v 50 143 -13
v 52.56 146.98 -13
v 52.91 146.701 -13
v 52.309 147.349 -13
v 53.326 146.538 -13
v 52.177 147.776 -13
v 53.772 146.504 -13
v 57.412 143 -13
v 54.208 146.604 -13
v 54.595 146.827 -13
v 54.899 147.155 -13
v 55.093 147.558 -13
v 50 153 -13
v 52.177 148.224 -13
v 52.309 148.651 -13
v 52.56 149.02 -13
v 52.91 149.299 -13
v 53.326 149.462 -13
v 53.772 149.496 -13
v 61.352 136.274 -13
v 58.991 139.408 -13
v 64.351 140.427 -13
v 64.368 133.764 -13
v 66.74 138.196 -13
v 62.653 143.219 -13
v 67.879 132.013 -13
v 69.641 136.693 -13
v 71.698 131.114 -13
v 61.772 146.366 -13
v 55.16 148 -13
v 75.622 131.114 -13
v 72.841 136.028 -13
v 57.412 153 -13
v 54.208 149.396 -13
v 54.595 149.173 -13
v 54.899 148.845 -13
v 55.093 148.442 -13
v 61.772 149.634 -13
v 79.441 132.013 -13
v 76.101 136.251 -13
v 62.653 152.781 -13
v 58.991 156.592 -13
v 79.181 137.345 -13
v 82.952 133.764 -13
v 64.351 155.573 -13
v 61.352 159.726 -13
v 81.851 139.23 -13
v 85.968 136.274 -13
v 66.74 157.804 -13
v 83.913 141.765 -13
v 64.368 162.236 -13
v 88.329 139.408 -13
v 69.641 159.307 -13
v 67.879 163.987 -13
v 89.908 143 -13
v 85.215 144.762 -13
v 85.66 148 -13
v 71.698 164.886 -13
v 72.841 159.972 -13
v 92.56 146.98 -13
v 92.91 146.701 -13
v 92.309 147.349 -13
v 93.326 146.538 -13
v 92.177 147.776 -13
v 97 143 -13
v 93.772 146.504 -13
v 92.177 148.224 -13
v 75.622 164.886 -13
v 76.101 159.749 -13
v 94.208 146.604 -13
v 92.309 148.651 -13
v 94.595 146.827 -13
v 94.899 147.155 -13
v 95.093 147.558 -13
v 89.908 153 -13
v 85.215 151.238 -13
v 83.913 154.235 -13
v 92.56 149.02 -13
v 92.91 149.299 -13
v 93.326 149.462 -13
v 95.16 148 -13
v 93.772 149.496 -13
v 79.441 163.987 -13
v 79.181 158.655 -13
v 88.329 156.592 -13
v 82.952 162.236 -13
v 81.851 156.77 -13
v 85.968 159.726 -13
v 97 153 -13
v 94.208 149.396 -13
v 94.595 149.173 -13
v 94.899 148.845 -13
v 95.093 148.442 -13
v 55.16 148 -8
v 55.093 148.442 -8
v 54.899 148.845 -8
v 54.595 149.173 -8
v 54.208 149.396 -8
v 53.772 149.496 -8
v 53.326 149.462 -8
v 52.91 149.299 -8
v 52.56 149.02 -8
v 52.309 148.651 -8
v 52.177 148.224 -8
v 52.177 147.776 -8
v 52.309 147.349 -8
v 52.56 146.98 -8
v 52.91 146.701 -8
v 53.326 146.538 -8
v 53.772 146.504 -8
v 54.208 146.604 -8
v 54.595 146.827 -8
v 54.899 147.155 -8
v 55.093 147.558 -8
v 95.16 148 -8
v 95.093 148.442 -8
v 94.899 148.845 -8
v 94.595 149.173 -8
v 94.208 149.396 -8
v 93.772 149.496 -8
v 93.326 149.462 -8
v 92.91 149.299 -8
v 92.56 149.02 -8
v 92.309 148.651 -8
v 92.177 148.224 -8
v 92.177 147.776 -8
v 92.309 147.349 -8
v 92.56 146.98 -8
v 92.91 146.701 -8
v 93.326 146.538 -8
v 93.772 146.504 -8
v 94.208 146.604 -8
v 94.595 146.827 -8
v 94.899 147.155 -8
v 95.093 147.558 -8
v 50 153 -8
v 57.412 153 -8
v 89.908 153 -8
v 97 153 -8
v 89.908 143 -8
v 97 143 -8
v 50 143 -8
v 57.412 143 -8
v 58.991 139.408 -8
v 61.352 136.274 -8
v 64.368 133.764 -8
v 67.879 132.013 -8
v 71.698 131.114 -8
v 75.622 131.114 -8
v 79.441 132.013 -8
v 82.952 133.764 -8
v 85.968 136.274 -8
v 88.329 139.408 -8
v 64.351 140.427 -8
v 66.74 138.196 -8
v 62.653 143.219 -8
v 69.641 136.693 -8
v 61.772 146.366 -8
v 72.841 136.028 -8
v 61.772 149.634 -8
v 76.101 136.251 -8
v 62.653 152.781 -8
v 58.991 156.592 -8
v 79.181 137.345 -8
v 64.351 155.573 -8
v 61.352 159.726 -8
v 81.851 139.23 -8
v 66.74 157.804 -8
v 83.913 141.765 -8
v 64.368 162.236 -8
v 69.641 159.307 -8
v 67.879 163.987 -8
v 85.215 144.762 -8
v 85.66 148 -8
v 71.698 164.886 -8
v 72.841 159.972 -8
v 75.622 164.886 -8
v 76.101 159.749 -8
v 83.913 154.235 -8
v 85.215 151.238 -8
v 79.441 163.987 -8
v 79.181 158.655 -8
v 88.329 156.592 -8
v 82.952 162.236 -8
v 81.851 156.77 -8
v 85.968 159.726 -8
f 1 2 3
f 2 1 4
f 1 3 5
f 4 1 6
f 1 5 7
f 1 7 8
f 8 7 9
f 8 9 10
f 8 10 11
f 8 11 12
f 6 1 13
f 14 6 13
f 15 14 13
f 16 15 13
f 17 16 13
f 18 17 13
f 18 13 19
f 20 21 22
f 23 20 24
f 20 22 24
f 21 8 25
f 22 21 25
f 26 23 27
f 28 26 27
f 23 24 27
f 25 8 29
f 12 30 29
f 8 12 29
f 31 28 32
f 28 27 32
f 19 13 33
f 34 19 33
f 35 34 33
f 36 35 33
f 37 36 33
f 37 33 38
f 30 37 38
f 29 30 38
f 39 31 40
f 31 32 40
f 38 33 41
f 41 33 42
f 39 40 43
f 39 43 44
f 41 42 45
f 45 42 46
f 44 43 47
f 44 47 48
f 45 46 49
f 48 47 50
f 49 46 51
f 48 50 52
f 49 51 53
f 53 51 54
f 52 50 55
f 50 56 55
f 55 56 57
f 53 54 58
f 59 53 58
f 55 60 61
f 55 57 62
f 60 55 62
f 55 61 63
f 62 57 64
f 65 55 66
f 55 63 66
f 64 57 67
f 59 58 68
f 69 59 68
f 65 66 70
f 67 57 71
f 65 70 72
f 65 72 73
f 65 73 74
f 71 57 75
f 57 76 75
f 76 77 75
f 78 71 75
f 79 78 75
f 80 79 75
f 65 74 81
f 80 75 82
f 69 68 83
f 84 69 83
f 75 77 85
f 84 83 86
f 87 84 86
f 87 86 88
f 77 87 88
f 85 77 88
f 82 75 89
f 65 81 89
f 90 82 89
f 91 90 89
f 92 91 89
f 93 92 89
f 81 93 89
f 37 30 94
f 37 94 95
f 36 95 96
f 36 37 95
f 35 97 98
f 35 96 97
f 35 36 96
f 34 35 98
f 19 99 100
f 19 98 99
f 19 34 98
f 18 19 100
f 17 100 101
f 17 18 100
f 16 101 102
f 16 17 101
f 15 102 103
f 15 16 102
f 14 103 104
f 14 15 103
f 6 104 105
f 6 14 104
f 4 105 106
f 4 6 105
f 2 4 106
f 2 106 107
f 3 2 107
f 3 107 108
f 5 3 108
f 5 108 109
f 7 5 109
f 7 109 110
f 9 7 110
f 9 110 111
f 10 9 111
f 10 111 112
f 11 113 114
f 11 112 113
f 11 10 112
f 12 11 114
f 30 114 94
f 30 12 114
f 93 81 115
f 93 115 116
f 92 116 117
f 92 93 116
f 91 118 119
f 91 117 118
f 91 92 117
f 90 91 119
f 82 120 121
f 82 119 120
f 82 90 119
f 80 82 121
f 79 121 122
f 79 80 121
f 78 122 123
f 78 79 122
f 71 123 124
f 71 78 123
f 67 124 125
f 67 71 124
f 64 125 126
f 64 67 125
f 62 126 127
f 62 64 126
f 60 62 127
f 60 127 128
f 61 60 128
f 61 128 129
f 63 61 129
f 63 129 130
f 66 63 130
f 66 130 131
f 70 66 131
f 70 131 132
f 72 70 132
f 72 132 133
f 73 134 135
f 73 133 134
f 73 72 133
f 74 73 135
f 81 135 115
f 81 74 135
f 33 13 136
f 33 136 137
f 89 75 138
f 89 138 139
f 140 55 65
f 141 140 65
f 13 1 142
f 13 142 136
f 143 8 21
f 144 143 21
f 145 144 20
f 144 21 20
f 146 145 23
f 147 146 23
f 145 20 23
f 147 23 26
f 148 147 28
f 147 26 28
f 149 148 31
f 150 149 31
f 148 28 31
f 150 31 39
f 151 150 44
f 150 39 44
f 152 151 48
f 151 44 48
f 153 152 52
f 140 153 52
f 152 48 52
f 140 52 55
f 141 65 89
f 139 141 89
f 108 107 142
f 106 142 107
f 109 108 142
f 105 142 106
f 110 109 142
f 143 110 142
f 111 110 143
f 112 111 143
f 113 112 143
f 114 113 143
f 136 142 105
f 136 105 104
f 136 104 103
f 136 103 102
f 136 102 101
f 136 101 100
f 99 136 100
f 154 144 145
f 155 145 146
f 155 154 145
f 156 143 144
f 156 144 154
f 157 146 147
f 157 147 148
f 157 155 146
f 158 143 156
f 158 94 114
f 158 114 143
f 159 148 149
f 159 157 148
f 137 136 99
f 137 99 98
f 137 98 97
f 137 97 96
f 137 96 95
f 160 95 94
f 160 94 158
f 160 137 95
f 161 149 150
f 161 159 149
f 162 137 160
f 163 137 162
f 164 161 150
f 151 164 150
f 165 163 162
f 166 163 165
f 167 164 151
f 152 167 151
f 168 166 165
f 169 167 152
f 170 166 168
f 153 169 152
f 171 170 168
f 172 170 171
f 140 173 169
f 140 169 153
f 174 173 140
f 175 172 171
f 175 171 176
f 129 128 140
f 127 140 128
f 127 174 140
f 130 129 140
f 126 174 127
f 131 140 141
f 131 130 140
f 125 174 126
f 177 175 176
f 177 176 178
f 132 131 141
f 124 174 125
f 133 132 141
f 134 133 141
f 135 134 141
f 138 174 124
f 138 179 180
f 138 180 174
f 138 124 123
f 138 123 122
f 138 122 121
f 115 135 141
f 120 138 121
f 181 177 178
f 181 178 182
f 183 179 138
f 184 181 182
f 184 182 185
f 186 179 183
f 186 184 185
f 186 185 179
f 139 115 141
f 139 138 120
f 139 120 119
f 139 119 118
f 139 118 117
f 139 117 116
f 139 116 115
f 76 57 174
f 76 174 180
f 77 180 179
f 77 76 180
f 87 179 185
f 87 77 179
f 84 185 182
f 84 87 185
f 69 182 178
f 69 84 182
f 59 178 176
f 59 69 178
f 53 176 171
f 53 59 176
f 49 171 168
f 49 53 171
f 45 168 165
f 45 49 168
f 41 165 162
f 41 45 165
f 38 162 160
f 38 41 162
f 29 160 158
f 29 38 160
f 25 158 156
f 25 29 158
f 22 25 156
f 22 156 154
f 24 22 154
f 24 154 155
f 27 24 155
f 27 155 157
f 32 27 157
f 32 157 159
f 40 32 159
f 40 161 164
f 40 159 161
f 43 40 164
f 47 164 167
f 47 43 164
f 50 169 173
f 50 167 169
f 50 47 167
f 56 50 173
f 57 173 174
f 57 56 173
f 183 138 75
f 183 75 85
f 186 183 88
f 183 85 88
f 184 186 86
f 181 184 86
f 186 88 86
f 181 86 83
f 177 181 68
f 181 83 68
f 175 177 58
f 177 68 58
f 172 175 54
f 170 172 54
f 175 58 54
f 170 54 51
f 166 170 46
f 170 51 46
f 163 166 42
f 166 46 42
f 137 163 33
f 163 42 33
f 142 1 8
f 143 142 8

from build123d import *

# Parameters (mm, degrees)
CYLINDER098_R     = 1.5
CYLINDER098_DEPTH = 14
CYLINDER097_R     = 12
CYLINDER097_DEPTH = 33
CYLINDER099_R     = 1.5
CYLINDER099_DEPTH = 14
BOX017_W          = 47
BOX017_H          = 10
BOX017_DEPTH      = 5
CYLINDER096_R     = 17
CYLINDER096_DEPTH = 5


with BuildPart() as ftinsmount003:
    # Cylinder098 → Cylinder098 (new body)
    with BuildSketch(Plane(origin=(53.66, 148, -15), x_dir=(1, 0, 0), z_dir=(0, 0, 1))):
        Circle(CYLINDER098_R)
    extrude(amount=CYLINDER098_DEPTH)


with BuildPart() as ftinsinnerhole002:
    # Cylinder097 → Cylinder097 (new body)
    with BuildSketch(Plane(origin=(73.66, 148, -10), x_dir=(1, 0, 0), z_dir=(0, 0, 1))):
        Circle(CYLINDER097_R)
    extrude(amount=CYLINDER097_DEPTH)


with BuildPart() as fusion041:
    # Cylinder099 → Cylinder099 (new body)
    with BuildSketch(Plane(origin=(93.66, 148, -14), x_dir=(1, 0, 0), z_dir=(0, 0, 1))):
        Circle(CYLINDER099_R)
    extrude(amount=CYLINDER099_DEPTH)

    # Fusion041: union FTInsMount003, FTInsInnerHole002
    add(ftinsmount003.part)
    add(ftinsinnerhole002.part)


with BuildPart() as ftinslug001:
    # Box017 → Box017 (new body)
    with BuildSketch(Plane(origin=(50, 143, -10), x_dir=(1, 0, 0), z_dir=(0, 0, 1))):
        with Locations((23.5, 5)):
            Rectangle(BOX017_W, BOX017_H)
    extrude(amount=BOX017_DEPTH)


with BuildPart() as ftinsbackplate:
    # Cylinder096 → Cylinder096 (new body)
    with BuildSketch(Plane(origin=(73.66, 148, -10), x_dir=(1, 0, 0), z_dir=(0, 0, 1))):
        Circle(CYLINDER096_R)
    extrude(amount=CYLINDER096_DEPTH)

    # Fusion042: union FTInsLug001
    add(ftinslug001.part)

    # Cut011: cut Fusion041
    add(fusion041.part, mode=Mode.SUBTRACT)


with BuildPart() as ftinsbackplate_1:
    # Cut011 placement: moved
    add(ftinsbackplate.part.moved(Location((0, 0, -3))))


solid = ftinsbackplate_1.part
